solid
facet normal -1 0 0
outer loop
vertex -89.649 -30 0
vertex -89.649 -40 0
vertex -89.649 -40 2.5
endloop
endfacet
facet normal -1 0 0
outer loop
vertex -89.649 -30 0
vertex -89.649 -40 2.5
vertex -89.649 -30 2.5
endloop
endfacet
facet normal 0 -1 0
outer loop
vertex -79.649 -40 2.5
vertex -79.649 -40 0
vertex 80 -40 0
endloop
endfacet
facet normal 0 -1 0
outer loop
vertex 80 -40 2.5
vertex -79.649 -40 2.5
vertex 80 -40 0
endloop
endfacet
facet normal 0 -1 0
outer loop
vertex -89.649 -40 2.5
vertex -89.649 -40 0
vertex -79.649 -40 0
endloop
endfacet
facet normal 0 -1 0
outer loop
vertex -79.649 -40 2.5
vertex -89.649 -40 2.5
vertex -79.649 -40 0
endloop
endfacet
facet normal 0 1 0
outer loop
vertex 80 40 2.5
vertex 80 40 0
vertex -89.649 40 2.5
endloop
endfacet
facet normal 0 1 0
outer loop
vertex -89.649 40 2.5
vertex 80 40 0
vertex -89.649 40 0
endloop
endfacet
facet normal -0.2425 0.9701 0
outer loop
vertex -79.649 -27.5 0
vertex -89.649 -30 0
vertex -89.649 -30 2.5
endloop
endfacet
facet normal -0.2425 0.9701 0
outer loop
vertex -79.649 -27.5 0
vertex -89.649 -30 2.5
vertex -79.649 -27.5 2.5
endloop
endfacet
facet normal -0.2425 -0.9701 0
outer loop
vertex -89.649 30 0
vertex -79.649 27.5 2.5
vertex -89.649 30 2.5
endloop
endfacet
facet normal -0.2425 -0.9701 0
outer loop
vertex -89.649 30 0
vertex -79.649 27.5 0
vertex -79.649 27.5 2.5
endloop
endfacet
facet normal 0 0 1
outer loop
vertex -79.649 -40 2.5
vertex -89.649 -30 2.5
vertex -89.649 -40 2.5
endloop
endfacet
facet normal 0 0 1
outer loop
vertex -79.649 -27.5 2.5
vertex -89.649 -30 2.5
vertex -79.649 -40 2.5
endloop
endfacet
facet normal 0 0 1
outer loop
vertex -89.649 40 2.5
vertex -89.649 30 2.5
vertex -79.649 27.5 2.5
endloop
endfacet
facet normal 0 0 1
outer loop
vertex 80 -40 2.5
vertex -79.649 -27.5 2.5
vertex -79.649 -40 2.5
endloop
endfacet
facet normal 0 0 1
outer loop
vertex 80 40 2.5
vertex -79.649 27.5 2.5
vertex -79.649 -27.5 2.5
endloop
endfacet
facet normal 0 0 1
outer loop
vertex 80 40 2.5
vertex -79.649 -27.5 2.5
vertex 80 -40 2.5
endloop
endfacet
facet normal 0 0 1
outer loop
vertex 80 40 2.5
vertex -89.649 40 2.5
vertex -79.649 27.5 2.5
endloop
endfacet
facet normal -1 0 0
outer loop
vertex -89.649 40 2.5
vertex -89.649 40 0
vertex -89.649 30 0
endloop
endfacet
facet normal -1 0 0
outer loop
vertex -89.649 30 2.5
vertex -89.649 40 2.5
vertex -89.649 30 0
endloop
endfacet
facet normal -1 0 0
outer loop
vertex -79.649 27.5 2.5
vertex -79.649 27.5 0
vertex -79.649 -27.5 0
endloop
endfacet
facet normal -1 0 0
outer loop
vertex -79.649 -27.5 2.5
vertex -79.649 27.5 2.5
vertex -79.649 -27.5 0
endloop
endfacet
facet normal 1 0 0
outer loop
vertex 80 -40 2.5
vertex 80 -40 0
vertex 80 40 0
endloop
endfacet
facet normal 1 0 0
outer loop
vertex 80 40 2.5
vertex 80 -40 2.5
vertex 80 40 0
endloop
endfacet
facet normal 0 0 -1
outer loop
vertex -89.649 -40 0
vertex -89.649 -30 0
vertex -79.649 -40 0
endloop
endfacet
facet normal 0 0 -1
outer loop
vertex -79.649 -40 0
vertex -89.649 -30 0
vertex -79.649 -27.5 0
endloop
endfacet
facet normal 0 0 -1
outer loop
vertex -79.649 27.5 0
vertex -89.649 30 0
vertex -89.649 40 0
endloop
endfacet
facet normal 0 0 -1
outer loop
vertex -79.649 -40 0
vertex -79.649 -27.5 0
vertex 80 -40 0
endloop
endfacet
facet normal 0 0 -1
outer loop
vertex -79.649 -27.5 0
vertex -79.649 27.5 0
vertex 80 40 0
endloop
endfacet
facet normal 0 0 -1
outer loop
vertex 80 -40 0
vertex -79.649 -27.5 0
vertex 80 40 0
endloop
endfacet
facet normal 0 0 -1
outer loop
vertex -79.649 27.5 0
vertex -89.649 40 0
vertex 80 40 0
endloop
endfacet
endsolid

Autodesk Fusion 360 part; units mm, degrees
sketch "Sketch1" plane through (0, 0, 0) normal (1, 0, 0) x (0, 1, 0)
sketch "Sketch2" plane through (0, 0, 0) normal (0, 1, 0) x (1, 0, 0)
sketch "Sketch3" plane through (0, 0, 0) normal (0, 0, 1) x (1, 0, 0)
  line L0 (-89.6492, -40) -> (80, -40)
  line L1 (80, -40) -> (80, 40)
  line L2 (80, 40) -> (-89.6492, 40)
  line L3 (-89.6492, 40) -> (-89.6492, 30)
  line L4 (-89.6492, -40) -> (-89.6492, -30)
  line L5 (-89.6492, -40) -> (-79.6492, -40)
  line L6 (-79.6492, 27.5) -> (-79.6492, -27.5)
  line L7 (-79.6492, 27.5) -> (-89.6492, 30)
  line L8 (-89.6492, -30) -> (-79.6492, -27.5)
extrude "Extrude1" add sketch "Sketch3" along normal blind 2.5
sketch "Sketch4" plane through (0, 0, 2.5) normal (0, 0, 1) x (-1, 0, 0)
  line L0 (89.6492, 40) -> (-80, 40)
  line L1 (-80, 40) -> (-80, -40)
  line L2 (-80, -40) -> (89.6492, -40)
  line L3 (89.6492, -40) -> (89.6492, -30)
  line L4 (89.6492, -30) -> (79.6492, -27.5)
  line L5 (79.6492, -27.5) -> (79.6492, 27.5)
  line L6 (79.6492, 27.5) -> (89.6492, 30)
  line L7 (89.6492, 30) -> (89.6492, 40)
  line L8 (89.6492, -40) -> (-80, -40)
  line L9 (-80, -40) -> (-80, 40)
  line L10 (89.6492, 40) -> (-80, 40)
  line L11 (89.6492, 30) -> (89.6492, 40)
  line L12 (89.6492, 30) -> (79.6492, 27.5)
  line L13 (79.6492, 27.5) -> (79.6492, -27.5)
  line L14 (79.6492, -27.5) -> (89.6492, -30)
  line L15 (89.6492, -40) -> (89.6492, -30)
  line L16 (89.6492, -40) -> (89.6492, -38.5)
  line L17 (88.1492, -38.5) -> (-78.5, -38.5)
  line L18 (-80, -40) -> (-78.5, -40)
  line L19 (-78.5, -38.5) -> (-78.5, 38.5)
  line L20 (-80, 40) -> (-80, 38.5)
  line L21 (-78.5, 38.5) -> (88.1492, 38.5)
  line L22 (89.6492, 40) -> (88.1492, 40)
  line L23 (88.1492, 38.5) -> (88.1492, 31)
  line L24 (89.6492, 30) -> (89.6492, 31.375)
  line L25 (88.1492, 31) -> (78.1492, 28.5)
  line L26 (78.1492, -28.4841) -> (78.1492, 28.5)
  line L27 (89.6492, -40) -> (88.1492, -40)
  line L28 (88.1492, -31.1066) -> (88.1492, -38.5)
  line L29 (89.6492, -30) -> (89.6492, -31.5)
  line L30 (88.1492, -31.1066) -> (78.1492, -28.4841)
  dimension "d9" = 1.5
  dimension "d11" = 1.5
